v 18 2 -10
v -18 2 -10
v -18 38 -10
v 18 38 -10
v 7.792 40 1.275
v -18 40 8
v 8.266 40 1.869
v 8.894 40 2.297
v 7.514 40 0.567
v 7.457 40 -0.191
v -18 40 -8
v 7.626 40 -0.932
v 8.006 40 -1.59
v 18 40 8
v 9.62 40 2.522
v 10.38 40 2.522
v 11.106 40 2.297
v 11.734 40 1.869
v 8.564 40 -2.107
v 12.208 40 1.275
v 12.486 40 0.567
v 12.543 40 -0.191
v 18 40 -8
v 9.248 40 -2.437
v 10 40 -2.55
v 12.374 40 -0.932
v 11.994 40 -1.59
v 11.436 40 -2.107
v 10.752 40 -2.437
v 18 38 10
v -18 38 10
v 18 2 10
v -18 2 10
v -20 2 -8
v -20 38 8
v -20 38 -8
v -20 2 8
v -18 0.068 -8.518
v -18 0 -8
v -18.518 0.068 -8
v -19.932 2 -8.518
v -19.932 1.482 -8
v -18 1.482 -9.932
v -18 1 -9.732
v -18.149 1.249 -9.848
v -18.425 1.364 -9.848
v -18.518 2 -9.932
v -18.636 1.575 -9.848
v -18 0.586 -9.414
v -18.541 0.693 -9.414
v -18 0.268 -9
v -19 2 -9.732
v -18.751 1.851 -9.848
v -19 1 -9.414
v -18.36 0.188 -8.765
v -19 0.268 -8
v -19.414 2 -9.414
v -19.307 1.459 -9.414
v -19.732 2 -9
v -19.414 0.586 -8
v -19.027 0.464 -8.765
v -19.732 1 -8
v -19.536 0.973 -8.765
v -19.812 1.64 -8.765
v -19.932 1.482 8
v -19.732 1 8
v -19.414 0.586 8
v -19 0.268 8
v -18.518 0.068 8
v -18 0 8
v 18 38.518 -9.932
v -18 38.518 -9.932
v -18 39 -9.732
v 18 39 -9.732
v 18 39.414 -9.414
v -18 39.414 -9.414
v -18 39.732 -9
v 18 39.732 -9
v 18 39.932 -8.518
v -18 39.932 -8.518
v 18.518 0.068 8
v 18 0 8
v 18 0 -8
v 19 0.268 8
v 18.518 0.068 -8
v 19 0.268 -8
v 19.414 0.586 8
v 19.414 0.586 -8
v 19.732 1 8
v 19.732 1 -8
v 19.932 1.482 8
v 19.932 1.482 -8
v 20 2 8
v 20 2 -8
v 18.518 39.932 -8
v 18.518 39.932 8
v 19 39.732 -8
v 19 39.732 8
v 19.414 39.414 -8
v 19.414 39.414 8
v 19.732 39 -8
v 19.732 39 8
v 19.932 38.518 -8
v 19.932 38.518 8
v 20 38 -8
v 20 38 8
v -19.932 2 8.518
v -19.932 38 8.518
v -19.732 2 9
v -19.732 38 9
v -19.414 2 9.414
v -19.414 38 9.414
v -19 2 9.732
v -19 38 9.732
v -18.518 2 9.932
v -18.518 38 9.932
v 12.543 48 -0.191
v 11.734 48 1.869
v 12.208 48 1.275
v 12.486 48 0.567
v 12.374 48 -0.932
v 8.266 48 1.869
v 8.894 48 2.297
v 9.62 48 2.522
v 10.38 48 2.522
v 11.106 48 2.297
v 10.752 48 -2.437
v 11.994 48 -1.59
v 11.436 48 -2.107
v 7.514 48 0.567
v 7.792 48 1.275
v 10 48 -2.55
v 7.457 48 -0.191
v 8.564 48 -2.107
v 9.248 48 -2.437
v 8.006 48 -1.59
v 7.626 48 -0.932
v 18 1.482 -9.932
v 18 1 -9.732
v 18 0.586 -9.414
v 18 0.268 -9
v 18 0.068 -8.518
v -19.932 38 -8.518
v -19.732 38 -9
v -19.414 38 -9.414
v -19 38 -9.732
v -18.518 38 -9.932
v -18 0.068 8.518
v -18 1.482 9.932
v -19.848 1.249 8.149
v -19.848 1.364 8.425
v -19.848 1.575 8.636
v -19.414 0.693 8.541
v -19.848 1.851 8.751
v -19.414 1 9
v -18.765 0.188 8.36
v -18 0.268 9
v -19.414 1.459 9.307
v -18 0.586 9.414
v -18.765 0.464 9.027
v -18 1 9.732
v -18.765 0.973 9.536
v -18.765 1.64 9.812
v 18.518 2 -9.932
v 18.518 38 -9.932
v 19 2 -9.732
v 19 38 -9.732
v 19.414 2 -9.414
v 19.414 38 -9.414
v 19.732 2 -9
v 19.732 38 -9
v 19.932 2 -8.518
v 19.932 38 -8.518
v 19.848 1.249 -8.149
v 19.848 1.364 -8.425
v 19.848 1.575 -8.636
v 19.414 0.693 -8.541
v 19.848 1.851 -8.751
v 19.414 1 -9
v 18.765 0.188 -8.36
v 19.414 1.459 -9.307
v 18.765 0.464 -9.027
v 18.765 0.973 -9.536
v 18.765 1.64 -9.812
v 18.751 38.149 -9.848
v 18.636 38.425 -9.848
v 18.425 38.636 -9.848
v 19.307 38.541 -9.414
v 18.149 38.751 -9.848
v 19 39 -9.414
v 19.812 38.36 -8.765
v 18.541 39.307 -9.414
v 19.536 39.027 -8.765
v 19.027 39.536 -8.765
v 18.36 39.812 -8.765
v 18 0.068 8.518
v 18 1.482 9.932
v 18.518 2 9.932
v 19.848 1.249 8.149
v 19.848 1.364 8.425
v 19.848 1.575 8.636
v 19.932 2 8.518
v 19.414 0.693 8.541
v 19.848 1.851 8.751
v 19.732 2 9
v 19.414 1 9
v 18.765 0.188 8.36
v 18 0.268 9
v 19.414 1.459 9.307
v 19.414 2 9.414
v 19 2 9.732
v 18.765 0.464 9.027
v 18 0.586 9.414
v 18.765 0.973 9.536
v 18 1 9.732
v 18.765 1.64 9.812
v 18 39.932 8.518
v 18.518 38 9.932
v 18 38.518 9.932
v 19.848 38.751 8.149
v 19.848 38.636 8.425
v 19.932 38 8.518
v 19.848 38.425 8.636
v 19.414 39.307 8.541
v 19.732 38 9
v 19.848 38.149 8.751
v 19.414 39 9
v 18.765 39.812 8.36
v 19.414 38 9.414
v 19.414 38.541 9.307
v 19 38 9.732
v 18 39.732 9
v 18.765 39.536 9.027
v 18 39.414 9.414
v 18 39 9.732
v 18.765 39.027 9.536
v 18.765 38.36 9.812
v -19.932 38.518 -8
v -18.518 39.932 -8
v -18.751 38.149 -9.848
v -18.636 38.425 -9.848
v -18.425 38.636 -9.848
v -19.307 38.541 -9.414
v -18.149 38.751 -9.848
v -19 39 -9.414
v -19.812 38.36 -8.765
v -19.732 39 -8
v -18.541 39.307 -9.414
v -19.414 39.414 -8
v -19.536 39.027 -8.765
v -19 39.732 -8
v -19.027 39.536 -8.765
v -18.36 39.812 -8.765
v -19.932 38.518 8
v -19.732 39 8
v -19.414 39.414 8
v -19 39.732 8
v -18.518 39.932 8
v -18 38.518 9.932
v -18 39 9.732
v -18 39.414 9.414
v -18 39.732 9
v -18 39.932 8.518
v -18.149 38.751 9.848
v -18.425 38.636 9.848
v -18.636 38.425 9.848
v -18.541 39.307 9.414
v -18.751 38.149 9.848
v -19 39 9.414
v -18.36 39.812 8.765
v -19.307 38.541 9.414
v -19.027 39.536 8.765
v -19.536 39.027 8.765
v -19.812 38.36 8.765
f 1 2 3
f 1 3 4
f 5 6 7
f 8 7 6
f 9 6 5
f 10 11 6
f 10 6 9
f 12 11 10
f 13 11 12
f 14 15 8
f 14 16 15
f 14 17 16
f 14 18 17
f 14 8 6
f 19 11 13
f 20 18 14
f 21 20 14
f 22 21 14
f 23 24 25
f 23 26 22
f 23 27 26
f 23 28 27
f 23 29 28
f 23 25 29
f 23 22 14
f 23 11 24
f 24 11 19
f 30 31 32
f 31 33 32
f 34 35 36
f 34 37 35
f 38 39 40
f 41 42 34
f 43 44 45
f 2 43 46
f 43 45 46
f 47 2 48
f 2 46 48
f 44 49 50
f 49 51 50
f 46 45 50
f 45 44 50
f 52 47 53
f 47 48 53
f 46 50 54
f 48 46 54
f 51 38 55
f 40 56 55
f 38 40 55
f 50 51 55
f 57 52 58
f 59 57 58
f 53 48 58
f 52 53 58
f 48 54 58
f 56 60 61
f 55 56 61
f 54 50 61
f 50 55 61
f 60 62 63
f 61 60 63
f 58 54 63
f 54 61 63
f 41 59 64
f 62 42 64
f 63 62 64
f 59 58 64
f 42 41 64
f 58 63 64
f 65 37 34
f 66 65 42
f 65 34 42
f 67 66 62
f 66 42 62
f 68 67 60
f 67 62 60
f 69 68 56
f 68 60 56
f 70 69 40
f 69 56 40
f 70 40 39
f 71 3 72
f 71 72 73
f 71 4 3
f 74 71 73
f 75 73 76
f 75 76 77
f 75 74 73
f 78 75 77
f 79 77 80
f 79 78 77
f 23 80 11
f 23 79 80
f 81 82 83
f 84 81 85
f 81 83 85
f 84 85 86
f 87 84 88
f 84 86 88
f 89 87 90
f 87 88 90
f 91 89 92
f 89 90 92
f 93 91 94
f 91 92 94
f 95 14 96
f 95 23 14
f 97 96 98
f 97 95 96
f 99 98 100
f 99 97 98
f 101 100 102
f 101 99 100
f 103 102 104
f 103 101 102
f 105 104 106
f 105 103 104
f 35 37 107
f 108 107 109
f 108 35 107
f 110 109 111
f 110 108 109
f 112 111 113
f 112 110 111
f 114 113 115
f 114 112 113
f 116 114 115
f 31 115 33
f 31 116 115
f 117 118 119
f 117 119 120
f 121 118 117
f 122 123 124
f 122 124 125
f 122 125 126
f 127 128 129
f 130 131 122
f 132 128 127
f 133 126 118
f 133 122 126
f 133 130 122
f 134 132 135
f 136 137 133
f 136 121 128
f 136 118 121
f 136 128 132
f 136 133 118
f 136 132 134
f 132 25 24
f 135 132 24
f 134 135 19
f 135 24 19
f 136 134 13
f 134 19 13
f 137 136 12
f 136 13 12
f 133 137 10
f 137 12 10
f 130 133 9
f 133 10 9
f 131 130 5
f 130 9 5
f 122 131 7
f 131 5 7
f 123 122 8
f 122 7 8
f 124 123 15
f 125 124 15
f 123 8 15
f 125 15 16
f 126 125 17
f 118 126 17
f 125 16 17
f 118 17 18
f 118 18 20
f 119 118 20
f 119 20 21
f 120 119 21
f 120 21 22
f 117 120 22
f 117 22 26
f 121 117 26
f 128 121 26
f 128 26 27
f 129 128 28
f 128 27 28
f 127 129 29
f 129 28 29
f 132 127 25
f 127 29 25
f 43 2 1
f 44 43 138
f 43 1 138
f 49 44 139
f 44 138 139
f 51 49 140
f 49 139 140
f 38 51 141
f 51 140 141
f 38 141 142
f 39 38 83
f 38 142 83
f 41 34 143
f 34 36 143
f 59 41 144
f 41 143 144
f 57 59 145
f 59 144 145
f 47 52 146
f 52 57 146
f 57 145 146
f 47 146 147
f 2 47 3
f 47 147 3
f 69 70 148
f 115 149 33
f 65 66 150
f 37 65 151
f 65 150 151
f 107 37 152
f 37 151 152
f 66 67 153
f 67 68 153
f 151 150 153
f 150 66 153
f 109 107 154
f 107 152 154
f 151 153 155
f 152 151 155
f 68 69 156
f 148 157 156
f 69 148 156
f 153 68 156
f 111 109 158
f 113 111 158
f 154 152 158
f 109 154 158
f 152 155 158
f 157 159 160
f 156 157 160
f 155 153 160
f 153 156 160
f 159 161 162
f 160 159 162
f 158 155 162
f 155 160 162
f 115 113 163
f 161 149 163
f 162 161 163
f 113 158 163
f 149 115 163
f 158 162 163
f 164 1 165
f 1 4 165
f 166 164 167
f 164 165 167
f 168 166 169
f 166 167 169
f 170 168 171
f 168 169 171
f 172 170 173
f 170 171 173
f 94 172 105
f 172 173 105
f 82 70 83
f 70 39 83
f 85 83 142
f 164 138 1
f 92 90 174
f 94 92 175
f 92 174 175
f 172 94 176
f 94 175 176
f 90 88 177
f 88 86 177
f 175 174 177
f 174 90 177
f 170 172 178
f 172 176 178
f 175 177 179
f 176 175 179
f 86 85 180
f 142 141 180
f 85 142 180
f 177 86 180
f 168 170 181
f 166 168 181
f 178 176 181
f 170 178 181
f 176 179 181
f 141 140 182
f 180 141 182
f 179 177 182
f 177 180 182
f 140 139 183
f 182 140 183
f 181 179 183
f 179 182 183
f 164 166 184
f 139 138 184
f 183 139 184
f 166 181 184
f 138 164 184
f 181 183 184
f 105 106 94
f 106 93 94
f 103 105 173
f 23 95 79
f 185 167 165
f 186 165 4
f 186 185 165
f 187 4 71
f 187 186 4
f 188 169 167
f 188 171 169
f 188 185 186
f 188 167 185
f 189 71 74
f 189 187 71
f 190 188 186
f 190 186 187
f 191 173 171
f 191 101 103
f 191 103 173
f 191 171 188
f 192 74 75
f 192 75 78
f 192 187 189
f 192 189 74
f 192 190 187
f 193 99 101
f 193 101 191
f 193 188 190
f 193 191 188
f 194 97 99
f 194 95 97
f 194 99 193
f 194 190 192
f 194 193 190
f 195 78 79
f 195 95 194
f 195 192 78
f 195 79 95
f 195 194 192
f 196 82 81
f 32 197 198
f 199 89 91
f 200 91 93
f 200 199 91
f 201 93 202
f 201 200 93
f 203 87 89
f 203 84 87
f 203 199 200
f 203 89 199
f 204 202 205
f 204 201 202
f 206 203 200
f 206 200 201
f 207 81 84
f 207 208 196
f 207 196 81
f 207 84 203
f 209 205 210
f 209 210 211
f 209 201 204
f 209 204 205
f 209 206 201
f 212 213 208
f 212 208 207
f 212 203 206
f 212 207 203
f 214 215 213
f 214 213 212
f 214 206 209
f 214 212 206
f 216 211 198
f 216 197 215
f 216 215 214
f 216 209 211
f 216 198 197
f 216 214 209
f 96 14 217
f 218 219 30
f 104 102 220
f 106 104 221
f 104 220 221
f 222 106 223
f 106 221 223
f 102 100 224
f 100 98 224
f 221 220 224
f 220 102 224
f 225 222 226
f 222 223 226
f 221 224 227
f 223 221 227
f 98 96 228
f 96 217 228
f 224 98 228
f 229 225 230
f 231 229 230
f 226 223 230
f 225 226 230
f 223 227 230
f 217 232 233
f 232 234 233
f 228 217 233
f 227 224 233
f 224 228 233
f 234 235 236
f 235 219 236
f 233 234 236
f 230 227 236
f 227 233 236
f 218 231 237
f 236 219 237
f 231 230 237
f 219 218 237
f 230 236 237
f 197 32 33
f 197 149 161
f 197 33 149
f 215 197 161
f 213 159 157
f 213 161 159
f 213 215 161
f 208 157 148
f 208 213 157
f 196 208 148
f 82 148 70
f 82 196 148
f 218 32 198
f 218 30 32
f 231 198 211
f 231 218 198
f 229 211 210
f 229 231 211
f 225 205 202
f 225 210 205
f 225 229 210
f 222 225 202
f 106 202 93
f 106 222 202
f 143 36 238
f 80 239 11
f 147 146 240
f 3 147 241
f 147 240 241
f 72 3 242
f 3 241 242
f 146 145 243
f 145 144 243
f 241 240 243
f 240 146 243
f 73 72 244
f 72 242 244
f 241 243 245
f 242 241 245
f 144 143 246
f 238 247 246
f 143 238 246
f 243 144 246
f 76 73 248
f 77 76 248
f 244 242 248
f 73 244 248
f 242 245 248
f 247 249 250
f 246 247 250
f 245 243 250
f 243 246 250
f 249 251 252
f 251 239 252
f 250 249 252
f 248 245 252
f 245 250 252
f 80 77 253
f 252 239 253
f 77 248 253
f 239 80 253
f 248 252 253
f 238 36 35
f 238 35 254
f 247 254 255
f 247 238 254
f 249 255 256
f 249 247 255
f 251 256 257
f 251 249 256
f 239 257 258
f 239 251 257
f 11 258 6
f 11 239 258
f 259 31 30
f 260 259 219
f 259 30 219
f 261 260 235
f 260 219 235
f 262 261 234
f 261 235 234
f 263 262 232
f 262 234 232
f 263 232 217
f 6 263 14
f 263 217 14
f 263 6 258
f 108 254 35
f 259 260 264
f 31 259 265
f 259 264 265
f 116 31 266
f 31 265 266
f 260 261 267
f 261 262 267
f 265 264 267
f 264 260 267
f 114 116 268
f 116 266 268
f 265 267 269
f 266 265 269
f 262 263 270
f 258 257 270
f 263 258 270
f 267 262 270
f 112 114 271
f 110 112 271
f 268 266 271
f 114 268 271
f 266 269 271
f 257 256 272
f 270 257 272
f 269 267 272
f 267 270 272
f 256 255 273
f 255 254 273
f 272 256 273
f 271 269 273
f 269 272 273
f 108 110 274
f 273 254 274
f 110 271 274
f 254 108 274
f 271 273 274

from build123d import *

# Parameters (mm, degrees)
SKETCH_1_W      = 40
SKETCH_1_H      = 20
EXTRUDE_1_DEPTH = 40
SKETCH_2_R      = 2.55
EXTRUDE_2_DEPTH = 8
FILLET_1_R      = 2


with BuildPart() as part:
    # 草图1 → 凸台-拉伸1 (new body)
    with BuildSketch(Plane(origin=(0, 0, 0), x_dir=(1, 0, 0), z_dir=(0, 1, 0))):
        Rectangle(SKETCH_1_W, SKETCH_1_H)
    extrude(amount=EXTRUDE_1_DEPTH)

    # 草图2 → 凸台-拉伸2 (add)
    with BuildSketch(Plane(origin=(0, 40, 0), x_dir=(1, 0, 0), z_dir=(0, 1, 0))):
        with Locations(Location((10, 0, 0), (0, 0, 90))):
            Circle(SKETCH_2_R)
    extrude(amount=EXTRUDE_2_DEPTH)

    # 圆角1
    fillet_1_edges = [part.edges().sort_by_distance(p)[0] for p in [
        (-20, 40, 0),
        (0, 40, 10),
        (20, 40, 0),
        (0, 0, 10),
        (-20, 0, 0),
        (0, 0, -10),
        (20, 0, 0),
        (20, 20, 10),
        (-20, 20, 10),
        (-20, 20, -10),
        (20, 20, -10),
        (0, 40, -10),
    ]]
    fillet(fillet_1_edges, radius=FILLET_1_R)


solid = part.part
